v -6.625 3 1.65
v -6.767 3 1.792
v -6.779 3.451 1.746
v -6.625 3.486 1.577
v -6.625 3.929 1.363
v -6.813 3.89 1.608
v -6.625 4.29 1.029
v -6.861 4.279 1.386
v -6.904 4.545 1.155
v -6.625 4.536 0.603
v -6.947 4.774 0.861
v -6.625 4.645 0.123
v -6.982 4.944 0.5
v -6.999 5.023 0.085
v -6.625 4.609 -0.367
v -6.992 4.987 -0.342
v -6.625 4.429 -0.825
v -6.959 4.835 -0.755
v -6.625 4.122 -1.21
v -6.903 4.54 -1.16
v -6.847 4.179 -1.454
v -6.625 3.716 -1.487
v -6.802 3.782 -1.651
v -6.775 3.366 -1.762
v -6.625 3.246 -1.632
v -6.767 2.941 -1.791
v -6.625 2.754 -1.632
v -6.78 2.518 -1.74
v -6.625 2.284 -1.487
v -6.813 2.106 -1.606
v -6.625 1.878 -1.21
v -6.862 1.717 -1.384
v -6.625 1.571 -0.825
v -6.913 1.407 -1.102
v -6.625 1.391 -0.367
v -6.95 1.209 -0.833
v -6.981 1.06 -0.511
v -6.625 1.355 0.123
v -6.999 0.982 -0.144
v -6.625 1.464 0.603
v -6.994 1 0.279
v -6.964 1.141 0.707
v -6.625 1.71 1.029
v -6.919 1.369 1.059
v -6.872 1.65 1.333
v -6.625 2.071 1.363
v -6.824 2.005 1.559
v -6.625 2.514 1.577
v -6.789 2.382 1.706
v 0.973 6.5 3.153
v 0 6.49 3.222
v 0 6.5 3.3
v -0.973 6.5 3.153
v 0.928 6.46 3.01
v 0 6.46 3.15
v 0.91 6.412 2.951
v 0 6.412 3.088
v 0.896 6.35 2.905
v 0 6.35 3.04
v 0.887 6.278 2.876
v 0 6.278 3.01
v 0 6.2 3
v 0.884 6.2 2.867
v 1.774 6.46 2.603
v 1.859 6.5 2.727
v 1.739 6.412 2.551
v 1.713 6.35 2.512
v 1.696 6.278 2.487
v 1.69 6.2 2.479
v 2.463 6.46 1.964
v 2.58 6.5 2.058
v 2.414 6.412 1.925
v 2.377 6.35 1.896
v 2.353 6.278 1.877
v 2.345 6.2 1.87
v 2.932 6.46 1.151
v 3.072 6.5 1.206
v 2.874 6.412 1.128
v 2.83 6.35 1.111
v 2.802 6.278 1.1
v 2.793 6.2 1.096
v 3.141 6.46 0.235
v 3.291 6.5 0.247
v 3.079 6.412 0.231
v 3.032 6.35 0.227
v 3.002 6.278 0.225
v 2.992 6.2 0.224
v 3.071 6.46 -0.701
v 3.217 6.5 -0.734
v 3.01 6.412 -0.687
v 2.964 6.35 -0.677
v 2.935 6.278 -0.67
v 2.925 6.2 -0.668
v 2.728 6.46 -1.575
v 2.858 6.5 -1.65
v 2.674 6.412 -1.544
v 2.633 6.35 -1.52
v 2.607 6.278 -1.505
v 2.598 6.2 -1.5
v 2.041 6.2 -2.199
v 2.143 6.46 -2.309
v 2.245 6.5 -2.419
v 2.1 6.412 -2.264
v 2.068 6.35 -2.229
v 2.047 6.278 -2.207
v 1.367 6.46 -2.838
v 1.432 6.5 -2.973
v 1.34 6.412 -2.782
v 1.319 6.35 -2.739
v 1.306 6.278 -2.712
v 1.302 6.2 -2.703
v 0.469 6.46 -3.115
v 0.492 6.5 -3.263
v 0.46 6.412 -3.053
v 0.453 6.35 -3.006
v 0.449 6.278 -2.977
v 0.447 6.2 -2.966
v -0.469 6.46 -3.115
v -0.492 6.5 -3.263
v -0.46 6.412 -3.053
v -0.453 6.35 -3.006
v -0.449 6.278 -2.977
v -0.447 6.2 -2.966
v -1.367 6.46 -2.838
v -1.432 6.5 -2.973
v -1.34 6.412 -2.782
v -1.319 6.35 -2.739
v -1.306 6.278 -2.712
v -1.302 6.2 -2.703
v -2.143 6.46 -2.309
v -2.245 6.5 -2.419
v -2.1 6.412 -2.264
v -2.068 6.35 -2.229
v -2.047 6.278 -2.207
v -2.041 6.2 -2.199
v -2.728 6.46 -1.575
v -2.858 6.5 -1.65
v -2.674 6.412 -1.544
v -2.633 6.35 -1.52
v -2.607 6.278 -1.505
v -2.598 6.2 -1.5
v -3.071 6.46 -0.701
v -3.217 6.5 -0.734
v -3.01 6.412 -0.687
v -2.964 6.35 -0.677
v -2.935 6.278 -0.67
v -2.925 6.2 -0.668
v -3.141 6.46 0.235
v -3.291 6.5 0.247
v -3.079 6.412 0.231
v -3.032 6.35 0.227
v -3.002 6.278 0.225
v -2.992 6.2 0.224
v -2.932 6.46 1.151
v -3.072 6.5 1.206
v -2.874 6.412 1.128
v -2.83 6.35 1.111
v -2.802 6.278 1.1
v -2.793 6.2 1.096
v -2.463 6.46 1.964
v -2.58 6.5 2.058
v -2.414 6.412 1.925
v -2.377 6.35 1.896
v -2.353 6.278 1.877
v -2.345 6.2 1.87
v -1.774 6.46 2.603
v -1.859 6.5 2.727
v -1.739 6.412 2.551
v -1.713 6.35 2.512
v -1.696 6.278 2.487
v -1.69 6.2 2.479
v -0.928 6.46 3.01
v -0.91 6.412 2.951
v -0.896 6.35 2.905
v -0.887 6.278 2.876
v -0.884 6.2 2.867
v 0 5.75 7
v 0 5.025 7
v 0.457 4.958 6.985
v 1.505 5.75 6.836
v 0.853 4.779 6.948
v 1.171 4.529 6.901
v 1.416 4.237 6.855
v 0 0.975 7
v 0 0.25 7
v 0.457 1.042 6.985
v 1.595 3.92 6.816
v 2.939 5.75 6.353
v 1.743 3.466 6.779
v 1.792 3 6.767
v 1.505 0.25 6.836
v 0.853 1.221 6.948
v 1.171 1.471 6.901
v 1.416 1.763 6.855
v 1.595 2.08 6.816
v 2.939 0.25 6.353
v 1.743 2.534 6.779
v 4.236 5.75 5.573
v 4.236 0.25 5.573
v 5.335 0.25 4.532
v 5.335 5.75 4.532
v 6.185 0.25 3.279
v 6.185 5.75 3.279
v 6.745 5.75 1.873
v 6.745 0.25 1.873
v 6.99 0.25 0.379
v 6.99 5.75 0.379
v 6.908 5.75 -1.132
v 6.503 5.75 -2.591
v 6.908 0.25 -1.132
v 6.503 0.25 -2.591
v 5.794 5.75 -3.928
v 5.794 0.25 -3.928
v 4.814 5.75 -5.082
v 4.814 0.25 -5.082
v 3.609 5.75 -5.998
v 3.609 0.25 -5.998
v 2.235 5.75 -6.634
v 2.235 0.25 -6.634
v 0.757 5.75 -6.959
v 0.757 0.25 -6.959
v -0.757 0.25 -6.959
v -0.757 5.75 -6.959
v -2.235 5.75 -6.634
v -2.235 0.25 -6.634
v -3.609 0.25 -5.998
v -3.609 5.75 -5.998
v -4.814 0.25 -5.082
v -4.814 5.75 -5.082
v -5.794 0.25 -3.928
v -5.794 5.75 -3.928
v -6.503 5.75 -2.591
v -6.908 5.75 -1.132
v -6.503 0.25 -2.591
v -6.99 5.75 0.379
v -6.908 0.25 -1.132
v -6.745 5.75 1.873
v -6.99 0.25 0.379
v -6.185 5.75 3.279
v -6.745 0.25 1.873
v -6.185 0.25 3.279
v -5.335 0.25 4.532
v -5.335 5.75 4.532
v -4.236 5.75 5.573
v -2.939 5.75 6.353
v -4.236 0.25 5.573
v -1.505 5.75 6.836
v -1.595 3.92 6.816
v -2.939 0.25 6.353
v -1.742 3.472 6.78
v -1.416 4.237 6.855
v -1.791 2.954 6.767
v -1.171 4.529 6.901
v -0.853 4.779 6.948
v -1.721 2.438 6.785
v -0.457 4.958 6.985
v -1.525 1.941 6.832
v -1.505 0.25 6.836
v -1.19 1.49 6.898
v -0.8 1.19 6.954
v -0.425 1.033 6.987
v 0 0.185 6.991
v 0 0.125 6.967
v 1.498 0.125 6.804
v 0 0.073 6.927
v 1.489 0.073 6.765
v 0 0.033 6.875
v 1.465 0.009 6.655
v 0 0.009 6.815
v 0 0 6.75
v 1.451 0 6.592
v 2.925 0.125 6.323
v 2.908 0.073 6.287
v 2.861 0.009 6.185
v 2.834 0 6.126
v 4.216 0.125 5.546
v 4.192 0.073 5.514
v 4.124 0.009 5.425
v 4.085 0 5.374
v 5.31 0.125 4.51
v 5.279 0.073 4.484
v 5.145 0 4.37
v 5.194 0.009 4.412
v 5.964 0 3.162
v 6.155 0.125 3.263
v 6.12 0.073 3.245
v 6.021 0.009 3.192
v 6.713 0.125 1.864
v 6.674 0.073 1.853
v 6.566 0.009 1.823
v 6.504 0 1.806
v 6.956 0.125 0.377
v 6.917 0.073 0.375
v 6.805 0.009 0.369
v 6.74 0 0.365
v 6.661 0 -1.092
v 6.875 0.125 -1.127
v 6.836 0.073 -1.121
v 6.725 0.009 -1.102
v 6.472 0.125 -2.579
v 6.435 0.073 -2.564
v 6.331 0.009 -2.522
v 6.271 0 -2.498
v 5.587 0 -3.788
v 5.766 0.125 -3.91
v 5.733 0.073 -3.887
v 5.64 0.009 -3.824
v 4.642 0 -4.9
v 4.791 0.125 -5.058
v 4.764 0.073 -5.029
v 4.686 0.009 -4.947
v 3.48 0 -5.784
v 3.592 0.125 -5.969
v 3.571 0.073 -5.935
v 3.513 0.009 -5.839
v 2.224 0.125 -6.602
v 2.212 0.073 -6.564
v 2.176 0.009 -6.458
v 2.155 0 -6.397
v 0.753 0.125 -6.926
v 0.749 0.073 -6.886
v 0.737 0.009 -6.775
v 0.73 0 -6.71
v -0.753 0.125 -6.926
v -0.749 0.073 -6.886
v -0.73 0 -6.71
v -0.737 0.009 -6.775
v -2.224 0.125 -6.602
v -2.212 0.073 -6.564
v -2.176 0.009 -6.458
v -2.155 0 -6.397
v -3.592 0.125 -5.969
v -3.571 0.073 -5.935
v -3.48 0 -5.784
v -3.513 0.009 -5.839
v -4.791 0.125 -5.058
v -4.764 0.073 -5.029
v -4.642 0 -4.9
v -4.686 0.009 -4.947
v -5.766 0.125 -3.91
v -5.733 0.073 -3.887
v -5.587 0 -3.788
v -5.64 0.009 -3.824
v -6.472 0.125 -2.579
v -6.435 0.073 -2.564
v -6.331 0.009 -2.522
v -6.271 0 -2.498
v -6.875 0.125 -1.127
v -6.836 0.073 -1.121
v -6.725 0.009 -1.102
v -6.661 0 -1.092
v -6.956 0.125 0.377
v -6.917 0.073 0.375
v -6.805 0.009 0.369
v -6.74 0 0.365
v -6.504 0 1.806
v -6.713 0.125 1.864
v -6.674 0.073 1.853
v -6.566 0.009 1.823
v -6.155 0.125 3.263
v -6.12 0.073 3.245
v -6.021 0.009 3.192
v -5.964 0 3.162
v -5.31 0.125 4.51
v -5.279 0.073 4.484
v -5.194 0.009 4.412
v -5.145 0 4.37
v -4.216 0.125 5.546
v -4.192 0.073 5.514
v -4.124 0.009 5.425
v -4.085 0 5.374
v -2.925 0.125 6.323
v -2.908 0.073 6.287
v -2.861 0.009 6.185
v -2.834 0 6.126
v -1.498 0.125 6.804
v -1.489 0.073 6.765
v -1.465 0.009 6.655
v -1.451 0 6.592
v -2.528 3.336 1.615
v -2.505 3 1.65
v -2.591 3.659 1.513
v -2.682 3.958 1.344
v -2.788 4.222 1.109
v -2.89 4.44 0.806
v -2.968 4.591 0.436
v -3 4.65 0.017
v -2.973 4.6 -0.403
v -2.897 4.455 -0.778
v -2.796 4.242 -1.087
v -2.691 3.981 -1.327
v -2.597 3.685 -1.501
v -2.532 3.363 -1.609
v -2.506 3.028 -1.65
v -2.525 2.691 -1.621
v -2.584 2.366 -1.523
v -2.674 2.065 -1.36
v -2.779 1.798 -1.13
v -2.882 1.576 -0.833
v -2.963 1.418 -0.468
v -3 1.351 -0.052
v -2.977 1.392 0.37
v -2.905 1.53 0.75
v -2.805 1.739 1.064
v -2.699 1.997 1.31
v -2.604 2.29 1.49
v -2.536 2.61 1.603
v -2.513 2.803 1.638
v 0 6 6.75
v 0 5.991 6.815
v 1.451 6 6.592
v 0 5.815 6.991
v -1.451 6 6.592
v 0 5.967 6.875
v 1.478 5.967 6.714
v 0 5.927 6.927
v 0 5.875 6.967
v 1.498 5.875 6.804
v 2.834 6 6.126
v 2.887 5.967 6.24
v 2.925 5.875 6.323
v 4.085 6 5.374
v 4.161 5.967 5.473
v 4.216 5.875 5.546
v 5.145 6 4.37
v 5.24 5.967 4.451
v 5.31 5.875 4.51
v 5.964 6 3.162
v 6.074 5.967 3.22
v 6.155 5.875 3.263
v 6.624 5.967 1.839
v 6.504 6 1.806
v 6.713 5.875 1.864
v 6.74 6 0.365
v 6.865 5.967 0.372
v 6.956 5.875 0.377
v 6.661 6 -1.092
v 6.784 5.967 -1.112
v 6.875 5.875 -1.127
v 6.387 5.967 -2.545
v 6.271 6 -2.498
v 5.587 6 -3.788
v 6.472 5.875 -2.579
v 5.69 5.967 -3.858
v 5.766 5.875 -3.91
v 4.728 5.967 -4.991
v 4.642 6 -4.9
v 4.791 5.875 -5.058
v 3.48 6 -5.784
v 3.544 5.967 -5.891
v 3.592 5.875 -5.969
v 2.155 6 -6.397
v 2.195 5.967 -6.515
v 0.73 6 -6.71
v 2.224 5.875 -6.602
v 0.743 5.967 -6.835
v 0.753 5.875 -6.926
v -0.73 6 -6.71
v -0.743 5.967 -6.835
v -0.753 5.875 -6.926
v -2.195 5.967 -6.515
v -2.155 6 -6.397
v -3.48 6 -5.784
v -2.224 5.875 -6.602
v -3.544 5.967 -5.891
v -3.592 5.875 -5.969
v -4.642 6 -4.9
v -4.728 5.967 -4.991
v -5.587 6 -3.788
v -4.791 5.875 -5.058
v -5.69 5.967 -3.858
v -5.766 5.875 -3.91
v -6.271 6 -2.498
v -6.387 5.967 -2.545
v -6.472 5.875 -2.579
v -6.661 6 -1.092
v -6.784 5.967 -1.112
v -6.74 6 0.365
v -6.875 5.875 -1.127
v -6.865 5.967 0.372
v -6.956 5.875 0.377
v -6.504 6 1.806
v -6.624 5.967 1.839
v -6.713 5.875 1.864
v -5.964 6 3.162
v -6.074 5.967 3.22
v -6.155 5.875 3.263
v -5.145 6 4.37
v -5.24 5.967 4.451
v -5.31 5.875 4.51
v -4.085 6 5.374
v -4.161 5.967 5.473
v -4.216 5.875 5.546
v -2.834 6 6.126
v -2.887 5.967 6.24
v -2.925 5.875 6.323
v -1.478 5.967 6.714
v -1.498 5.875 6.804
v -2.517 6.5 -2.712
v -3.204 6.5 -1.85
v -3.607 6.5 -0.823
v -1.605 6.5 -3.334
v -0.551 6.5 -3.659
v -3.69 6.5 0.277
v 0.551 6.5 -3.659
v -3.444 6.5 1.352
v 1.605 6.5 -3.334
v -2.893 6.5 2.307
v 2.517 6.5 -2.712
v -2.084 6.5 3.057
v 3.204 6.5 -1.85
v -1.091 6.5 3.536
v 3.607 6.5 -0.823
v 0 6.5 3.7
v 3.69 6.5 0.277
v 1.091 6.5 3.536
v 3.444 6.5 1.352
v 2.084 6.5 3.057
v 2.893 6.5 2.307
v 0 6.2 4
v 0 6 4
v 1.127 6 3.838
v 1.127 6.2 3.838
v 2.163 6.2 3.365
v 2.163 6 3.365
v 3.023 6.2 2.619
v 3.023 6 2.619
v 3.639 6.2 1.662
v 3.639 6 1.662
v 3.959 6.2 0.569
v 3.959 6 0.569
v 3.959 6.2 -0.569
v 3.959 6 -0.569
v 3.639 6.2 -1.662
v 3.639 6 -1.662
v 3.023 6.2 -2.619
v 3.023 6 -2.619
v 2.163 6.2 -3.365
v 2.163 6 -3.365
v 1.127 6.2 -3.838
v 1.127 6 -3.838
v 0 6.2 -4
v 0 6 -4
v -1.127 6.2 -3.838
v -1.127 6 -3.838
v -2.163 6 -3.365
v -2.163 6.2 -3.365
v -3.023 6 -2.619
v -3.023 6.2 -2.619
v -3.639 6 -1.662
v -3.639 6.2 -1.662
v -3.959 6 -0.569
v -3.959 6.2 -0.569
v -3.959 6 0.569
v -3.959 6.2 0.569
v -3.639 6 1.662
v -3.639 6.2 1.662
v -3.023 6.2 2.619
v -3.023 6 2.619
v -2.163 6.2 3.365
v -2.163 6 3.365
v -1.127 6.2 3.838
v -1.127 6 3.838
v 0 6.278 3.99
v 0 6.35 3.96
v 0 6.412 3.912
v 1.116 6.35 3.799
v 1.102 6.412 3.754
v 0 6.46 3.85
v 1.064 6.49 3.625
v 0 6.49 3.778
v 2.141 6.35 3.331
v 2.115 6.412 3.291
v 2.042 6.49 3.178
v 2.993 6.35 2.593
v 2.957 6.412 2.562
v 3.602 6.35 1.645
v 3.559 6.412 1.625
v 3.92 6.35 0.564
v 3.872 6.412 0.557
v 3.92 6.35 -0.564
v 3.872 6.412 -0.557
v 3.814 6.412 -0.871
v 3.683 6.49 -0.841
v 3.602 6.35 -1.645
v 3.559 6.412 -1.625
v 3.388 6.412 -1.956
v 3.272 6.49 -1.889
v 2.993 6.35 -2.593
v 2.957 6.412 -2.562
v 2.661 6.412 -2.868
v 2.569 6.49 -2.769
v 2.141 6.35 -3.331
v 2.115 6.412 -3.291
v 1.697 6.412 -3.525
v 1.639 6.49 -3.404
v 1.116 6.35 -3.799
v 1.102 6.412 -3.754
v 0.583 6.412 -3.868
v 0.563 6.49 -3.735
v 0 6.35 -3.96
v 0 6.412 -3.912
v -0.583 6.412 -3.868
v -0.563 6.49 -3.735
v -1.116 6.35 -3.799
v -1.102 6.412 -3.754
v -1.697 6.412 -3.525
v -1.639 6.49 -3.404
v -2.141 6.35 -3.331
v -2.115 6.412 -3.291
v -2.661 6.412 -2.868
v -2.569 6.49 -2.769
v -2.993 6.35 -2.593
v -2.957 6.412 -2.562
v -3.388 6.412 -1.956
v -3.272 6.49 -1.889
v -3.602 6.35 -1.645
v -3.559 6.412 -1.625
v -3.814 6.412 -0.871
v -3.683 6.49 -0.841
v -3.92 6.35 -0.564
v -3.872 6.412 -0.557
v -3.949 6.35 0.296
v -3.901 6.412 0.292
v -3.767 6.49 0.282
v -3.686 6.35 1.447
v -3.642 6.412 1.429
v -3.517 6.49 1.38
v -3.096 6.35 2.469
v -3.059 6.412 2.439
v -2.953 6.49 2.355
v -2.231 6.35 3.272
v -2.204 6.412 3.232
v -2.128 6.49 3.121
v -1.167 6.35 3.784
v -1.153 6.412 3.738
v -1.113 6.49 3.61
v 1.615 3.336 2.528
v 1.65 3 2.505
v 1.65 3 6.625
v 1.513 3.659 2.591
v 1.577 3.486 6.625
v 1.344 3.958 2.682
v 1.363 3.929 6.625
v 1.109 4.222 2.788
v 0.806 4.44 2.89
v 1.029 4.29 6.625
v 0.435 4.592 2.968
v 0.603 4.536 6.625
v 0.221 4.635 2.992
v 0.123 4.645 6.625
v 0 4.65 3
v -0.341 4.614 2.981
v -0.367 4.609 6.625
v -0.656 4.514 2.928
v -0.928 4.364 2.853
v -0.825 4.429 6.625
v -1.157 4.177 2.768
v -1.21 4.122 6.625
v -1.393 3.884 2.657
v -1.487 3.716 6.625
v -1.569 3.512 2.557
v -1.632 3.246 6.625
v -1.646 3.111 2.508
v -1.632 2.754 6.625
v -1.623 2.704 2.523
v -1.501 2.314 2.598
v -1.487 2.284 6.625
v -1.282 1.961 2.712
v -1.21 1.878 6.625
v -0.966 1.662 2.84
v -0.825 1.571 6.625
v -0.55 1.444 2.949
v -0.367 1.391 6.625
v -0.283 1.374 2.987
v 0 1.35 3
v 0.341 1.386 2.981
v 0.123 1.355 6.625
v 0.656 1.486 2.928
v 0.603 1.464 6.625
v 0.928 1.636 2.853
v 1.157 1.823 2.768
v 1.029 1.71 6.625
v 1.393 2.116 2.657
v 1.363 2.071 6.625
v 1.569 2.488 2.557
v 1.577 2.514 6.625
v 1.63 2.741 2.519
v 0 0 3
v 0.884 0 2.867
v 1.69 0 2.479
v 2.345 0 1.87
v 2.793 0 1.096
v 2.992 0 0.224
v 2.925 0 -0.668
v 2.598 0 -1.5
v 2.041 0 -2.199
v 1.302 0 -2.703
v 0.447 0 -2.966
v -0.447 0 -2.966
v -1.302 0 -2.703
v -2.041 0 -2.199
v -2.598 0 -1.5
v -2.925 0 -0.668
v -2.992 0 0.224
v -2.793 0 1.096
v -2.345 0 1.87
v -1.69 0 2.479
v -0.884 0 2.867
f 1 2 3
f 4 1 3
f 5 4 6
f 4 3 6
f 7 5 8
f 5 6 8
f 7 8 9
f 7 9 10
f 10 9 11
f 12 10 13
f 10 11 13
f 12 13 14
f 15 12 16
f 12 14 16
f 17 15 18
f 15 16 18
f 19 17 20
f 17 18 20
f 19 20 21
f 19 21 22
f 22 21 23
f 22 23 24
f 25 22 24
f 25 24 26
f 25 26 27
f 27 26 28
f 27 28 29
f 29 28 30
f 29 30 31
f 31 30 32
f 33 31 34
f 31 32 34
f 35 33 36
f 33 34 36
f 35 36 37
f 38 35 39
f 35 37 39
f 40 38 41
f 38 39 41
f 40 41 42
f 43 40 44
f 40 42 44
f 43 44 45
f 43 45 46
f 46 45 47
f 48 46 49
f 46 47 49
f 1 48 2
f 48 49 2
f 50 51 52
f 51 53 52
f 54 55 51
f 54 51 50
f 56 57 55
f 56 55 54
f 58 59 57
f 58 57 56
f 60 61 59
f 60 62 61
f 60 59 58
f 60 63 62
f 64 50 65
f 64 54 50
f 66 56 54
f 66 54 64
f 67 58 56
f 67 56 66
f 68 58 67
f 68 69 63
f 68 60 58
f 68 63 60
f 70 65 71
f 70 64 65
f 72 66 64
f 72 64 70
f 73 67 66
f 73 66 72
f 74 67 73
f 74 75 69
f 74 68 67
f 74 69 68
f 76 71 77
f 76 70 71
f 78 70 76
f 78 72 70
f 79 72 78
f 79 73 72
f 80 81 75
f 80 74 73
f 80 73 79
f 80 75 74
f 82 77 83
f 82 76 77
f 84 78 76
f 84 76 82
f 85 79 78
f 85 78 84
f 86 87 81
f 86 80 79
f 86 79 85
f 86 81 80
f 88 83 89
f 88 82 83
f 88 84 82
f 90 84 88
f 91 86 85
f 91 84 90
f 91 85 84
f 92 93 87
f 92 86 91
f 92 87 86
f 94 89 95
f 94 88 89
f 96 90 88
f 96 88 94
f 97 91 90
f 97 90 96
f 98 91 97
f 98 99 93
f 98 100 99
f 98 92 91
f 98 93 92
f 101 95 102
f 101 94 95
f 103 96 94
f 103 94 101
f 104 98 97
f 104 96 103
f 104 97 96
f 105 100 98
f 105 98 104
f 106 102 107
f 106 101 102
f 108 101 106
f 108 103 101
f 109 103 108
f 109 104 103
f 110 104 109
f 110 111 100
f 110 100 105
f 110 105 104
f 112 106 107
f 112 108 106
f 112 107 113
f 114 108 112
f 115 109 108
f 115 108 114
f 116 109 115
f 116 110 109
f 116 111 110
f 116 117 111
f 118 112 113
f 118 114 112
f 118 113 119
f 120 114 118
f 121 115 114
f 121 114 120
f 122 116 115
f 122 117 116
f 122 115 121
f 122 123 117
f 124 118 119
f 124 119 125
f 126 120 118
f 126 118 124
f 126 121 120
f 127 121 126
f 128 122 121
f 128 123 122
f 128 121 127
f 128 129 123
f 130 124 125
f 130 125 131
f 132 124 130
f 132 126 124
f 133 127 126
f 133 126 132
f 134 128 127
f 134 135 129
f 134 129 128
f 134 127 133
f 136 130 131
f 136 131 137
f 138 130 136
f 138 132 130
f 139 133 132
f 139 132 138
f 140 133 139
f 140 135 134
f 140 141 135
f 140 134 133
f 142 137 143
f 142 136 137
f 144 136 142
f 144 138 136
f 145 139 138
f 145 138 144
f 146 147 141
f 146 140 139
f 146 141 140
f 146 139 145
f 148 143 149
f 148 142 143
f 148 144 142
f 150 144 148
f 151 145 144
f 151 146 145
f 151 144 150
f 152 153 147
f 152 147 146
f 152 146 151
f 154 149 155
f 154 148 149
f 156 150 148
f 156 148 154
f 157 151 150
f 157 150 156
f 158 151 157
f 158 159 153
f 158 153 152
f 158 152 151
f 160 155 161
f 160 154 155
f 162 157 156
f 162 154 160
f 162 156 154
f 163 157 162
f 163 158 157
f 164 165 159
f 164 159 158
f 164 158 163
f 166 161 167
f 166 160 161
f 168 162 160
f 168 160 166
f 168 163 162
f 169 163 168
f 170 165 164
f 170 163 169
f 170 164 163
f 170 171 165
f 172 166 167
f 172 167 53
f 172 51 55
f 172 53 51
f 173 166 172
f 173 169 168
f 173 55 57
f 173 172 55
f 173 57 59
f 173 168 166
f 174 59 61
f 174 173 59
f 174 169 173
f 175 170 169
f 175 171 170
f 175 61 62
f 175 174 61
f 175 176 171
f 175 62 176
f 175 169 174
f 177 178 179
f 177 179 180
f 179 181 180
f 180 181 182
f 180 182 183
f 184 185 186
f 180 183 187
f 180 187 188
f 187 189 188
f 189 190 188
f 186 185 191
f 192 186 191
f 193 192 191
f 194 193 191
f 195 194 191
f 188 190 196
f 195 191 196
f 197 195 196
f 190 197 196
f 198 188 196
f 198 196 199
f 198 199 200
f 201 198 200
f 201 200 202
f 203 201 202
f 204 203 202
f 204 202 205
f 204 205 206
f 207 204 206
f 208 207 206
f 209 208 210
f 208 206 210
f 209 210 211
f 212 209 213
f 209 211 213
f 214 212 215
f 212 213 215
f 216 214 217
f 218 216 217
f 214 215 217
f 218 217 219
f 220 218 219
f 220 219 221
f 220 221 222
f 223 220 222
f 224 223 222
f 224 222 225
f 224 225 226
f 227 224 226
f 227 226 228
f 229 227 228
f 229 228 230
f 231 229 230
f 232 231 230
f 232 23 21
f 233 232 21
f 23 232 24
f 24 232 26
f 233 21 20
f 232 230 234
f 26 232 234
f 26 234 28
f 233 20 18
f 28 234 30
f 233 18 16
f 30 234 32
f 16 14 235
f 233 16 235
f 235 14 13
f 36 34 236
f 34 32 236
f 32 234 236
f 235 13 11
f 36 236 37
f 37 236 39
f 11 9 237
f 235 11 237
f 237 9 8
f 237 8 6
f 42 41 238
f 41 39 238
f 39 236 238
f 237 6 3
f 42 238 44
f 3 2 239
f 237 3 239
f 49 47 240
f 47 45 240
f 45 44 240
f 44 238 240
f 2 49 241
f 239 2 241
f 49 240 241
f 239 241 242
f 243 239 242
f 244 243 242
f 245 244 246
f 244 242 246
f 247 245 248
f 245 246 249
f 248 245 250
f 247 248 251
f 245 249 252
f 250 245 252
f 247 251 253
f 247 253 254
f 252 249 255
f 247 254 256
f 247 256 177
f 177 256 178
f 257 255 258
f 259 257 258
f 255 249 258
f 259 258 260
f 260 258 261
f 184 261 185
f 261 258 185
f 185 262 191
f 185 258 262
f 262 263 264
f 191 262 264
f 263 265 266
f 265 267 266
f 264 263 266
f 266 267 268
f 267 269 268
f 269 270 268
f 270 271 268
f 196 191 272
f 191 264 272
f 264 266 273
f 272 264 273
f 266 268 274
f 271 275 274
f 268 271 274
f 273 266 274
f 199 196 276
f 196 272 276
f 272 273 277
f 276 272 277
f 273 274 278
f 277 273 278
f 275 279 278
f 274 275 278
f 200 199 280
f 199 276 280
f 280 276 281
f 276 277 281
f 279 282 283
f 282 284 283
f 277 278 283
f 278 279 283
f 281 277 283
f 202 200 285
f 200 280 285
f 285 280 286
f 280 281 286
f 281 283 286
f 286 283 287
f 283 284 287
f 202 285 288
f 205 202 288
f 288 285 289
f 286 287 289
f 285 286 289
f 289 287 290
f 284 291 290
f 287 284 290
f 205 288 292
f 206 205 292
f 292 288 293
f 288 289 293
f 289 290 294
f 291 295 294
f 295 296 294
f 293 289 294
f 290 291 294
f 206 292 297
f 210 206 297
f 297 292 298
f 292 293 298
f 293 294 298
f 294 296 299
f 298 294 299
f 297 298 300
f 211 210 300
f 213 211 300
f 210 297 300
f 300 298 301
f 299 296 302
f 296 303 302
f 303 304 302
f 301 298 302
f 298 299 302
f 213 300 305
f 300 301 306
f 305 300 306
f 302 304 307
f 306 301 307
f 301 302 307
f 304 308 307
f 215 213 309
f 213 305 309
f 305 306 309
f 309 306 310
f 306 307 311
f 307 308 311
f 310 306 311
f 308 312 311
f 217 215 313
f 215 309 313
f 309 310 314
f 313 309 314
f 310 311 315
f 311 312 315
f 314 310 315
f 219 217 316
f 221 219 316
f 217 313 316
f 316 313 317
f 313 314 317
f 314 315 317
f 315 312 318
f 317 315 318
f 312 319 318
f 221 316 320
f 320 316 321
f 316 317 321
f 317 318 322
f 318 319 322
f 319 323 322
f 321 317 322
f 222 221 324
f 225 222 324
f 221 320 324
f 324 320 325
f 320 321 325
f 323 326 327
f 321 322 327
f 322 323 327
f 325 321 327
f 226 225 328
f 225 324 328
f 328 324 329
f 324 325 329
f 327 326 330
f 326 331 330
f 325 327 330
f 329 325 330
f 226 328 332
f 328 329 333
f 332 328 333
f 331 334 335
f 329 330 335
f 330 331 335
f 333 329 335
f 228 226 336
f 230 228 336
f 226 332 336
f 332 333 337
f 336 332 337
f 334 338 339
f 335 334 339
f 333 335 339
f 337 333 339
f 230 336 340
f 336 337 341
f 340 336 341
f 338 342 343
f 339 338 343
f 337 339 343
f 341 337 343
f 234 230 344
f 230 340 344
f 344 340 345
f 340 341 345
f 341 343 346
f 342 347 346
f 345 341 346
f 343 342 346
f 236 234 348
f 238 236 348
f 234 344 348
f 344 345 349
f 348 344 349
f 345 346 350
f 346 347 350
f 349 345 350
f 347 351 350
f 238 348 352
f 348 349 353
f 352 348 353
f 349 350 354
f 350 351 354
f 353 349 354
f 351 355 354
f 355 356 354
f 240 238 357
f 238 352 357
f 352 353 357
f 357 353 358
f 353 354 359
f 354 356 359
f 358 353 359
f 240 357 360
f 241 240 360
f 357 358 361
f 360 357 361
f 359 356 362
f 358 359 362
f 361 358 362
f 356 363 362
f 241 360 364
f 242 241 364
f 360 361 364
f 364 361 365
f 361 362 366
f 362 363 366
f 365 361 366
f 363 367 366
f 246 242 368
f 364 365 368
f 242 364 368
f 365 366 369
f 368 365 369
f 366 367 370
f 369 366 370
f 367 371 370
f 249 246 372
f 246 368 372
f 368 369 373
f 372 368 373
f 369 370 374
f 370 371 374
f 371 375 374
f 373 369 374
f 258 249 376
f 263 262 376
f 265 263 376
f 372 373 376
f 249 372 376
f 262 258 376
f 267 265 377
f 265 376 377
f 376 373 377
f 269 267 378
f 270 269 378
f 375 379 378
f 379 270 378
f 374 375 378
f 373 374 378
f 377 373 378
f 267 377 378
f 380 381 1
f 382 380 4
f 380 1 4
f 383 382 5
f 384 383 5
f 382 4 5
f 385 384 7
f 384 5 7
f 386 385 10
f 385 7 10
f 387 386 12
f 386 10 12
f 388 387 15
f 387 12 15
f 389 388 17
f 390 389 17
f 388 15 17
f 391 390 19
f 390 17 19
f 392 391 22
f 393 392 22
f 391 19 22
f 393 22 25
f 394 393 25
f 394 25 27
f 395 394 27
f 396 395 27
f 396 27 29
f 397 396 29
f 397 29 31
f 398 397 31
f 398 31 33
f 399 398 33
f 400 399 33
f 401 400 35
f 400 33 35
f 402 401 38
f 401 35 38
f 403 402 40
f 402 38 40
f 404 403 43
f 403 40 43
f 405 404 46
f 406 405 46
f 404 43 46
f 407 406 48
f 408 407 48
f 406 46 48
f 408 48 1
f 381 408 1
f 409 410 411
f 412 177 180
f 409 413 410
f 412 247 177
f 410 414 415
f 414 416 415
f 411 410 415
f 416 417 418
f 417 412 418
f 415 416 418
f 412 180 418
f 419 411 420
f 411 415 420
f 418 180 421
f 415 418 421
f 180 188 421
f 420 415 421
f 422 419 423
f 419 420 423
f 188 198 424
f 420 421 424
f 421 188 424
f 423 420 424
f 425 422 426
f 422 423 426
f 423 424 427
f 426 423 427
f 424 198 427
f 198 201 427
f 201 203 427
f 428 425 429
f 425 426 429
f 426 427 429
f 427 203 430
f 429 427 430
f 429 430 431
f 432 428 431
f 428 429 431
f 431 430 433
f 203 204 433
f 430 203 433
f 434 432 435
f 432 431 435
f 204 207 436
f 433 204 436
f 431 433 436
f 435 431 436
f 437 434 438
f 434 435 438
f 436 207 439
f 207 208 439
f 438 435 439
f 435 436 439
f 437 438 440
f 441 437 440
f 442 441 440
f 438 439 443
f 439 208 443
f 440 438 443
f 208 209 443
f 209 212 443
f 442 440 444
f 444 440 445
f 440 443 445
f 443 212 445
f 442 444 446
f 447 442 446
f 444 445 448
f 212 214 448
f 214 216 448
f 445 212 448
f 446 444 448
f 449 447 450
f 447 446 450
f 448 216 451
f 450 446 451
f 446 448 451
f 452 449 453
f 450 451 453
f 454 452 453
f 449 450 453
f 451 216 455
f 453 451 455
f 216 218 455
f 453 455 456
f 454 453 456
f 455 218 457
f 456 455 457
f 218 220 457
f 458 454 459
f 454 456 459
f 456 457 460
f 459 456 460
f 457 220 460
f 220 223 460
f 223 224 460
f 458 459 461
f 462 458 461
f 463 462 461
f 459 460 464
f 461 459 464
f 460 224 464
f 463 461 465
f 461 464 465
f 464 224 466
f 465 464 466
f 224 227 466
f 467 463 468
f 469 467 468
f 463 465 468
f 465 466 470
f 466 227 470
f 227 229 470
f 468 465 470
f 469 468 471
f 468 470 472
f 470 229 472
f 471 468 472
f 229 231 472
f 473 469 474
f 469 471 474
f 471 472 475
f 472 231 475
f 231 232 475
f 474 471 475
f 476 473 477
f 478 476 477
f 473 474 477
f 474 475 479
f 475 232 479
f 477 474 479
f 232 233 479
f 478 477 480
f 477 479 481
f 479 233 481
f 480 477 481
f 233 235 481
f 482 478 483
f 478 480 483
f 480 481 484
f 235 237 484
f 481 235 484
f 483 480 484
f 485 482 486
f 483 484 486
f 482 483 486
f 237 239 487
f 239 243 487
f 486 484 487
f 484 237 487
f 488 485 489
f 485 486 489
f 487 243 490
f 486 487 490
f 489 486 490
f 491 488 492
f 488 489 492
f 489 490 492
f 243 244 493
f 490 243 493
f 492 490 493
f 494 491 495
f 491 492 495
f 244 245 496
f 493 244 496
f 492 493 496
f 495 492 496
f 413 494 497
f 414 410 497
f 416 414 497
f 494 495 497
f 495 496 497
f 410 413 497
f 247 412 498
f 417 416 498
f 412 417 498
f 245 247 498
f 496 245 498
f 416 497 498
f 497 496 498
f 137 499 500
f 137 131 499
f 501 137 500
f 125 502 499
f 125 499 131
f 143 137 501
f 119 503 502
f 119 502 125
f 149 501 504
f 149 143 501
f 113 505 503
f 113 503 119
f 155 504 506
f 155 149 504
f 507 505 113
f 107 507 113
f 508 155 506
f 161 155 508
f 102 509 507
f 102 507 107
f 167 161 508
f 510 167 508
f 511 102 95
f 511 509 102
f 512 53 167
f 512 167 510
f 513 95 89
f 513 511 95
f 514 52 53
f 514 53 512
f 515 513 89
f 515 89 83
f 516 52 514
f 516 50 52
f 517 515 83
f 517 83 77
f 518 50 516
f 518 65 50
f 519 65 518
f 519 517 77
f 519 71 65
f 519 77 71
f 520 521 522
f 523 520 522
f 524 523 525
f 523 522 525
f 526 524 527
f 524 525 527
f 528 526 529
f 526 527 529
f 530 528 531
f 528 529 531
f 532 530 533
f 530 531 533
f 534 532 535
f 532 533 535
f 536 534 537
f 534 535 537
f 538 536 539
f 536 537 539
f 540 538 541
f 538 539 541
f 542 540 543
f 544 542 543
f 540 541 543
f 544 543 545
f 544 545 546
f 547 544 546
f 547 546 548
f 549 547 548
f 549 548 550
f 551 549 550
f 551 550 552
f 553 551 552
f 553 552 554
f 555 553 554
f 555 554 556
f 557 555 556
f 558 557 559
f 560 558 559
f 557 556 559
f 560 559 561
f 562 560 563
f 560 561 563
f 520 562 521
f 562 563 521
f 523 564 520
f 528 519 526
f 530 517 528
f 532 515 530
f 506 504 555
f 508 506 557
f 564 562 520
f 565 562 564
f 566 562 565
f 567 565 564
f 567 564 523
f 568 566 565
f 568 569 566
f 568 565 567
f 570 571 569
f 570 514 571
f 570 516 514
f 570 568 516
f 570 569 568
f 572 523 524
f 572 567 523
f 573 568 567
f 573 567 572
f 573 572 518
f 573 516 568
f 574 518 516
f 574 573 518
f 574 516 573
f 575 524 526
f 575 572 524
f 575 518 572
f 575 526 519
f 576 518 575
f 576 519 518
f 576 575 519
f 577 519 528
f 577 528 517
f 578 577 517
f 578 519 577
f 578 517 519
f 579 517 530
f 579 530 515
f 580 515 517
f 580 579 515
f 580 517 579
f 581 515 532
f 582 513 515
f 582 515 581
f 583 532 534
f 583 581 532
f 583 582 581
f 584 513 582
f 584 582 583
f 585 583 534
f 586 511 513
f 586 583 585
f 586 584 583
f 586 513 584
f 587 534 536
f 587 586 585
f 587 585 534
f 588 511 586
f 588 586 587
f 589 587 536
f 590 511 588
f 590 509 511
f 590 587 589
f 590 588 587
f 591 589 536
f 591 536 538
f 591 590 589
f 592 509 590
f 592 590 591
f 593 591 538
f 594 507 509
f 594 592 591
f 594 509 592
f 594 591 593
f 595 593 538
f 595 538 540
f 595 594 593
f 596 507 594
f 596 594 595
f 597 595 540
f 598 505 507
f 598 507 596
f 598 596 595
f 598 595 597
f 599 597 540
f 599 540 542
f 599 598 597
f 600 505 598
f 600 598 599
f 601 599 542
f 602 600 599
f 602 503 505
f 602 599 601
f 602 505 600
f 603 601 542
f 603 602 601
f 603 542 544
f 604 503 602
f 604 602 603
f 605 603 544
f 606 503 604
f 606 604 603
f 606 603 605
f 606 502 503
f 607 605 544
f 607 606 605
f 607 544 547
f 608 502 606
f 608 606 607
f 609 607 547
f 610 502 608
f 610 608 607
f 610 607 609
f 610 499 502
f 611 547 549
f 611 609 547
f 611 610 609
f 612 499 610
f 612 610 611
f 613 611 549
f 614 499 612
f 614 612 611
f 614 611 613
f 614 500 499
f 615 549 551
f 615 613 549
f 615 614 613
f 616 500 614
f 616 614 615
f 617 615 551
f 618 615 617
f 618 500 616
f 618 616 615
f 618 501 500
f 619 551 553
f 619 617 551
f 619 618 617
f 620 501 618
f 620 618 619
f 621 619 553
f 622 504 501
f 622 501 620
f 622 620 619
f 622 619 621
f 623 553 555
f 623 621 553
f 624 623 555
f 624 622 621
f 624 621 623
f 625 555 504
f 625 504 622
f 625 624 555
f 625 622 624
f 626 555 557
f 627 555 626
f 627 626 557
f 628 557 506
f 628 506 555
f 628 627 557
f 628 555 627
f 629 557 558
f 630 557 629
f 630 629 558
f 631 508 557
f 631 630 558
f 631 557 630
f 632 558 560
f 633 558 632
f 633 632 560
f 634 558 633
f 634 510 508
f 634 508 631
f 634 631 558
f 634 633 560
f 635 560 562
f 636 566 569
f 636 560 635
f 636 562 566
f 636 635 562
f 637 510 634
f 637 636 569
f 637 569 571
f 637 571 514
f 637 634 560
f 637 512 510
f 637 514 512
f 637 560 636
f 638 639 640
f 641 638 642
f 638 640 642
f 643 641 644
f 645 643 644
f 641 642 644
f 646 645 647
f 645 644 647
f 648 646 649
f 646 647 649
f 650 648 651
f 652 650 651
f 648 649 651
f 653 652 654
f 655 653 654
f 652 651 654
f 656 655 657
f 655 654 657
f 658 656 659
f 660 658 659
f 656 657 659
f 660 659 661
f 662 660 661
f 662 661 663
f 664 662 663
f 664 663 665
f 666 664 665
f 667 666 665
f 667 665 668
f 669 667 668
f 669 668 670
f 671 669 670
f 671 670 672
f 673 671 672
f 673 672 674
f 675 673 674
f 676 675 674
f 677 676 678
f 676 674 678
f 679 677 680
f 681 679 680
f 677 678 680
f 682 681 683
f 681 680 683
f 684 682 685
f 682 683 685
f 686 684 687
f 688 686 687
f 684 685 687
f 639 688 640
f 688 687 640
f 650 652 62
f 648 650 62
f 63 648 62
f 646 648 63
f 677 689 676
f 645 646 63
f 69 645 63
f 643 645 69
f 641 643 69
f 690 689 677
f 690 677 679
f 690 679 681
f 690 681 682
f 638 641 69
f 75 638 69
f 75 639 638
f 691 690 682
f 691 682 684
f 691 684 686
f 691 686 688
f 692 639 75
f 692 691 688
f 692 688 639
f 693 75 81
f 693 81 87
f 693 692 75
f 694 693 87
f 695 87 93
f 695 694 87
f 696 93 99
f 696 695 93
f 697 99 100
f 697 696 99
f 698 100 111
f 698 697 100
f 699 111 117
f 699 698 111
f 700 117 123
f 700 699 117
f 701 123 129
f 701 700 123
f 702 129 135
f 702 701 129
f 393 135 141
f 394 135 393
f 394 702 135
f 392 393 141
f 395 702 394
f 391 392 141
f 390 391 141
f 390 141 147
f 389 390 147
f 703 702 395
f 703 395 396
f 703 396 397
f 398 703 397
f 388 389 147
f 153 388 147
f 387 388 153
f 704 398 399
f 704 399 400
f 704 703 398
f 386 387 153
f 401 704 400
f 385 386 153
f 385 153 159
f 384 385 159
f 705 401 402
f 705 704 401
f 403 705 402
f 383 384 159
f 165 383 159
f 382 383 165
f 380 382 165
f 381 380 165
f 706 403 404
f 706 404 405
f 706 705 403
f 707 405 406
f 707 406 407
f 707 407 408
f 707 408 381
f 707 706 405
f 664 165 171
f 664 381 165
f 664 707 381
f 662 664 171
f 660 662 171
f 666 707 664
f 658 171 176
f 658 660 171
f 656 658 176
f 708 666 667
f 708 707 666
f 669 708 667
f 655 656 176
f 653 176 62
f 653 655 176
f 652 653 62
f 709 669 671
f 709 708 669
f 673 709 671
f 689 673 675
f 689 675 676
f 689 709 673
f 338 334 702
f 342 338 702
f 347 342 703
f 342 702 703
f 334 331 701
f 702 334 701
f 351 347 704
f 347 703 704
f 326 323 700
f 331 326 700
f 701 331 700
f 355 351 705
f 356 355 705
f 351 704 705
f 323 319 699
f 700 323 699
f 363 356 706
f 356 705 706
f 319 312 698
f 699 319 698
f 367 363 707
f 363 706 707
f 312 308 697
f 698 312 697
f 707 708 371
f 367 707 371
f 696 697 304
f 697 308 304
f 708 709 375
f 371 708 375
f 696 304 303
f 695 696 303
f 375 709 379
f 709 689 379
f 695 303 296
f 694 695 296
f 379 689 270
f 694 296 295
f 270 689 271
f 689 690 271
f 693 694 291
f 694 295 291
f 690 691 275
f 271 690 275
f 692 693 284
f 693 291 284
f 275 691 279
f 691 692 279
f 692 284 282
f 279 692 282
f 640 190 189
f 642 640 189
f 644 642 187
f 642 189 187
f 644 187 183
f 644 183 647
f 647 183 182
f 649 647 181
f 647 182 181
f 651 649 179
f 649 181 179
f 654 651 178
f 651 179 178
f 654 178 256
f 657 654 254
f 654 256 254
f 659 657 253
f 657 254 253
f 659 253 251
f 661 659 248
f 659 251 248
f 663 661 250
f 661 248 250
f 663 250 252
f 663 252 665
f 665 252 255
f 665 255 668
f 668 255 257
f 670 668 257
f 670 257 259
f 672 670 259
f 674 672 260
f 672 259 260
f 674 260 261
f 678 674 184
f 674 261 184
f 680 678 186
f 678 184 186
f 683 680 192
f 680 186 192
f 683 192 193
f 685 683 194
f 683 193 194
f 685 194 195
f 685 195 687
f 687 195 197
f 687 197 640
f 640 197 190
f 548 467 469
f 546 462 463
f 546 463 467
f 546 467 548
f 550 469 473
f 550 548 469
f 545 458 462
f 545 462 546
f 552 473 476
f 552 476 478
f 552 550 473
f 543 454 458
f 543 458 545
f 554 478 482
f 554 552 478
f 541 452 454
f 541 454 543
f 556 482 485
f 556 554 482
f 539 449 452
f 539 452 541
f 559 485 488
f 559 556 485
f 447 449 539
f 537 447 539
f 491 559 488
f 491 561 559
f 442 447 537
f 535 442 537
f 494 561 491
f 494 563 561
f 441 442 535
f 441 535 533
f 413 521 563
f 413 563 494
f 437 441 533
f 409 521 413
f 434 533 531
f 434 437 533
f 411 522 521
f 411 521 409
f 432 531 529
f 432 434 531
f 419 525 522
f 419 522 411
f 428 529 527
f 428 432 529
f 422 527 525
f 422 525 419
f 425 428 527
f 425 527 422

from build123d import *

# Parameters (mm, degrees)
SKETCH1_R           = 7
SKETCH1_R_2         = 3
BOSS_EXTRUDE1_DEPTH = 6
SKETCH2_R           = 4
SKETCH2_R_2         = 3
BOSS_EXTRUDE2_DEPTH = 0.5
FILLET1_R           = 0.3
FILLET2_R           = 0.25
CIRPATTERN1_COUNT   = 2
CIRPATTERN1_ANGLE   = 90


# Read off the part's stored shape, not the designer's step: M4 Tapped Hole1
with BuildPart() as part:
    # Sketch1 → Boss-Extrude1 (new body)
    with BuildSketch(Plane(origin=(0, 0, 0), x_dir=(1, 0, 0), z_dir=(0, 1, 0))):
        with Locations(Location((0, 0, 0), (0, 0, 270))):
            Circle(SKETCH1_R)
        with Locations(Location((0, 0, 0), (0, 0, 270))):
            Circle(SKETCH1_R_2, mode=Mode.SUBTRACT)
    extrude(amount=BOSS_EXTRUDE1_DEPTH)

    # Sketch2 → Boss-Extrude2 (add)
    with BuildSketch(Plane(origin=(0, 6, 0), x_dir=(1, 0, 0), z_dir=(0, 1, 0))):
        with Locations(Location((0, 0, 0), (0, 0, 270))):
            Circle(SKETCH2_R)
        with Locations(Location((0, 0, 0), (0, 0, 270))):
            Circle(SKETCH2_R_2, mode=Mode.SUBTRACT)
    extrude(amount=BOSS_EXTRUDE2_DEPTH)

    # Fillet1
    fillet1_edges = [part.edges().sort_by_distance(p)[0] for p in [
        (0, 6.5, -4),
        (0, 6.5, -3),
    ]]
    fillet(fillet1_edges, radius=FILLET1_R)

    # Fillet2
    fillet2_edges = [part.edges().sort_by_distance(p)[0] for p in [
        (0, 0, -7),
        (0, 6, -7),
    ]]
    fillet(fillet2_edges, radius=FILLET2_R)

    # M4 Tapped Hole1 outline → M4 Tapped Hole1 (revolve, cut)
    with BuildSketch(Plane.XZ.offset(-3)):
        Polygon((2.025001015, 7.000001015), (0, 7.000001015), (0, 2.505277626), (1.65, 2.505277626), (1.65, 6.625), align=None)
    m4_tapped_hole1 = revolve(axis=Axis((0, 3, 0), (0, 0, 1)), mode=Mode.SUBTRACT)

    # CirPattern1: M4 Tapped Hole1 ×2 about axis
    cirpattern1_axis = Axis((0, 6, 0), (0, -1, 0))
    for i in range(1, CIRPATTERN1_COUNT):
        add(m4_tapped_hole1.rotate(cirpattern1_axis, i * CIRPATTERN1_ANGLE / (CIRPATTERN1_COUNT - 1)), mode=Mode.SUBTRACT)


solid = part.part
